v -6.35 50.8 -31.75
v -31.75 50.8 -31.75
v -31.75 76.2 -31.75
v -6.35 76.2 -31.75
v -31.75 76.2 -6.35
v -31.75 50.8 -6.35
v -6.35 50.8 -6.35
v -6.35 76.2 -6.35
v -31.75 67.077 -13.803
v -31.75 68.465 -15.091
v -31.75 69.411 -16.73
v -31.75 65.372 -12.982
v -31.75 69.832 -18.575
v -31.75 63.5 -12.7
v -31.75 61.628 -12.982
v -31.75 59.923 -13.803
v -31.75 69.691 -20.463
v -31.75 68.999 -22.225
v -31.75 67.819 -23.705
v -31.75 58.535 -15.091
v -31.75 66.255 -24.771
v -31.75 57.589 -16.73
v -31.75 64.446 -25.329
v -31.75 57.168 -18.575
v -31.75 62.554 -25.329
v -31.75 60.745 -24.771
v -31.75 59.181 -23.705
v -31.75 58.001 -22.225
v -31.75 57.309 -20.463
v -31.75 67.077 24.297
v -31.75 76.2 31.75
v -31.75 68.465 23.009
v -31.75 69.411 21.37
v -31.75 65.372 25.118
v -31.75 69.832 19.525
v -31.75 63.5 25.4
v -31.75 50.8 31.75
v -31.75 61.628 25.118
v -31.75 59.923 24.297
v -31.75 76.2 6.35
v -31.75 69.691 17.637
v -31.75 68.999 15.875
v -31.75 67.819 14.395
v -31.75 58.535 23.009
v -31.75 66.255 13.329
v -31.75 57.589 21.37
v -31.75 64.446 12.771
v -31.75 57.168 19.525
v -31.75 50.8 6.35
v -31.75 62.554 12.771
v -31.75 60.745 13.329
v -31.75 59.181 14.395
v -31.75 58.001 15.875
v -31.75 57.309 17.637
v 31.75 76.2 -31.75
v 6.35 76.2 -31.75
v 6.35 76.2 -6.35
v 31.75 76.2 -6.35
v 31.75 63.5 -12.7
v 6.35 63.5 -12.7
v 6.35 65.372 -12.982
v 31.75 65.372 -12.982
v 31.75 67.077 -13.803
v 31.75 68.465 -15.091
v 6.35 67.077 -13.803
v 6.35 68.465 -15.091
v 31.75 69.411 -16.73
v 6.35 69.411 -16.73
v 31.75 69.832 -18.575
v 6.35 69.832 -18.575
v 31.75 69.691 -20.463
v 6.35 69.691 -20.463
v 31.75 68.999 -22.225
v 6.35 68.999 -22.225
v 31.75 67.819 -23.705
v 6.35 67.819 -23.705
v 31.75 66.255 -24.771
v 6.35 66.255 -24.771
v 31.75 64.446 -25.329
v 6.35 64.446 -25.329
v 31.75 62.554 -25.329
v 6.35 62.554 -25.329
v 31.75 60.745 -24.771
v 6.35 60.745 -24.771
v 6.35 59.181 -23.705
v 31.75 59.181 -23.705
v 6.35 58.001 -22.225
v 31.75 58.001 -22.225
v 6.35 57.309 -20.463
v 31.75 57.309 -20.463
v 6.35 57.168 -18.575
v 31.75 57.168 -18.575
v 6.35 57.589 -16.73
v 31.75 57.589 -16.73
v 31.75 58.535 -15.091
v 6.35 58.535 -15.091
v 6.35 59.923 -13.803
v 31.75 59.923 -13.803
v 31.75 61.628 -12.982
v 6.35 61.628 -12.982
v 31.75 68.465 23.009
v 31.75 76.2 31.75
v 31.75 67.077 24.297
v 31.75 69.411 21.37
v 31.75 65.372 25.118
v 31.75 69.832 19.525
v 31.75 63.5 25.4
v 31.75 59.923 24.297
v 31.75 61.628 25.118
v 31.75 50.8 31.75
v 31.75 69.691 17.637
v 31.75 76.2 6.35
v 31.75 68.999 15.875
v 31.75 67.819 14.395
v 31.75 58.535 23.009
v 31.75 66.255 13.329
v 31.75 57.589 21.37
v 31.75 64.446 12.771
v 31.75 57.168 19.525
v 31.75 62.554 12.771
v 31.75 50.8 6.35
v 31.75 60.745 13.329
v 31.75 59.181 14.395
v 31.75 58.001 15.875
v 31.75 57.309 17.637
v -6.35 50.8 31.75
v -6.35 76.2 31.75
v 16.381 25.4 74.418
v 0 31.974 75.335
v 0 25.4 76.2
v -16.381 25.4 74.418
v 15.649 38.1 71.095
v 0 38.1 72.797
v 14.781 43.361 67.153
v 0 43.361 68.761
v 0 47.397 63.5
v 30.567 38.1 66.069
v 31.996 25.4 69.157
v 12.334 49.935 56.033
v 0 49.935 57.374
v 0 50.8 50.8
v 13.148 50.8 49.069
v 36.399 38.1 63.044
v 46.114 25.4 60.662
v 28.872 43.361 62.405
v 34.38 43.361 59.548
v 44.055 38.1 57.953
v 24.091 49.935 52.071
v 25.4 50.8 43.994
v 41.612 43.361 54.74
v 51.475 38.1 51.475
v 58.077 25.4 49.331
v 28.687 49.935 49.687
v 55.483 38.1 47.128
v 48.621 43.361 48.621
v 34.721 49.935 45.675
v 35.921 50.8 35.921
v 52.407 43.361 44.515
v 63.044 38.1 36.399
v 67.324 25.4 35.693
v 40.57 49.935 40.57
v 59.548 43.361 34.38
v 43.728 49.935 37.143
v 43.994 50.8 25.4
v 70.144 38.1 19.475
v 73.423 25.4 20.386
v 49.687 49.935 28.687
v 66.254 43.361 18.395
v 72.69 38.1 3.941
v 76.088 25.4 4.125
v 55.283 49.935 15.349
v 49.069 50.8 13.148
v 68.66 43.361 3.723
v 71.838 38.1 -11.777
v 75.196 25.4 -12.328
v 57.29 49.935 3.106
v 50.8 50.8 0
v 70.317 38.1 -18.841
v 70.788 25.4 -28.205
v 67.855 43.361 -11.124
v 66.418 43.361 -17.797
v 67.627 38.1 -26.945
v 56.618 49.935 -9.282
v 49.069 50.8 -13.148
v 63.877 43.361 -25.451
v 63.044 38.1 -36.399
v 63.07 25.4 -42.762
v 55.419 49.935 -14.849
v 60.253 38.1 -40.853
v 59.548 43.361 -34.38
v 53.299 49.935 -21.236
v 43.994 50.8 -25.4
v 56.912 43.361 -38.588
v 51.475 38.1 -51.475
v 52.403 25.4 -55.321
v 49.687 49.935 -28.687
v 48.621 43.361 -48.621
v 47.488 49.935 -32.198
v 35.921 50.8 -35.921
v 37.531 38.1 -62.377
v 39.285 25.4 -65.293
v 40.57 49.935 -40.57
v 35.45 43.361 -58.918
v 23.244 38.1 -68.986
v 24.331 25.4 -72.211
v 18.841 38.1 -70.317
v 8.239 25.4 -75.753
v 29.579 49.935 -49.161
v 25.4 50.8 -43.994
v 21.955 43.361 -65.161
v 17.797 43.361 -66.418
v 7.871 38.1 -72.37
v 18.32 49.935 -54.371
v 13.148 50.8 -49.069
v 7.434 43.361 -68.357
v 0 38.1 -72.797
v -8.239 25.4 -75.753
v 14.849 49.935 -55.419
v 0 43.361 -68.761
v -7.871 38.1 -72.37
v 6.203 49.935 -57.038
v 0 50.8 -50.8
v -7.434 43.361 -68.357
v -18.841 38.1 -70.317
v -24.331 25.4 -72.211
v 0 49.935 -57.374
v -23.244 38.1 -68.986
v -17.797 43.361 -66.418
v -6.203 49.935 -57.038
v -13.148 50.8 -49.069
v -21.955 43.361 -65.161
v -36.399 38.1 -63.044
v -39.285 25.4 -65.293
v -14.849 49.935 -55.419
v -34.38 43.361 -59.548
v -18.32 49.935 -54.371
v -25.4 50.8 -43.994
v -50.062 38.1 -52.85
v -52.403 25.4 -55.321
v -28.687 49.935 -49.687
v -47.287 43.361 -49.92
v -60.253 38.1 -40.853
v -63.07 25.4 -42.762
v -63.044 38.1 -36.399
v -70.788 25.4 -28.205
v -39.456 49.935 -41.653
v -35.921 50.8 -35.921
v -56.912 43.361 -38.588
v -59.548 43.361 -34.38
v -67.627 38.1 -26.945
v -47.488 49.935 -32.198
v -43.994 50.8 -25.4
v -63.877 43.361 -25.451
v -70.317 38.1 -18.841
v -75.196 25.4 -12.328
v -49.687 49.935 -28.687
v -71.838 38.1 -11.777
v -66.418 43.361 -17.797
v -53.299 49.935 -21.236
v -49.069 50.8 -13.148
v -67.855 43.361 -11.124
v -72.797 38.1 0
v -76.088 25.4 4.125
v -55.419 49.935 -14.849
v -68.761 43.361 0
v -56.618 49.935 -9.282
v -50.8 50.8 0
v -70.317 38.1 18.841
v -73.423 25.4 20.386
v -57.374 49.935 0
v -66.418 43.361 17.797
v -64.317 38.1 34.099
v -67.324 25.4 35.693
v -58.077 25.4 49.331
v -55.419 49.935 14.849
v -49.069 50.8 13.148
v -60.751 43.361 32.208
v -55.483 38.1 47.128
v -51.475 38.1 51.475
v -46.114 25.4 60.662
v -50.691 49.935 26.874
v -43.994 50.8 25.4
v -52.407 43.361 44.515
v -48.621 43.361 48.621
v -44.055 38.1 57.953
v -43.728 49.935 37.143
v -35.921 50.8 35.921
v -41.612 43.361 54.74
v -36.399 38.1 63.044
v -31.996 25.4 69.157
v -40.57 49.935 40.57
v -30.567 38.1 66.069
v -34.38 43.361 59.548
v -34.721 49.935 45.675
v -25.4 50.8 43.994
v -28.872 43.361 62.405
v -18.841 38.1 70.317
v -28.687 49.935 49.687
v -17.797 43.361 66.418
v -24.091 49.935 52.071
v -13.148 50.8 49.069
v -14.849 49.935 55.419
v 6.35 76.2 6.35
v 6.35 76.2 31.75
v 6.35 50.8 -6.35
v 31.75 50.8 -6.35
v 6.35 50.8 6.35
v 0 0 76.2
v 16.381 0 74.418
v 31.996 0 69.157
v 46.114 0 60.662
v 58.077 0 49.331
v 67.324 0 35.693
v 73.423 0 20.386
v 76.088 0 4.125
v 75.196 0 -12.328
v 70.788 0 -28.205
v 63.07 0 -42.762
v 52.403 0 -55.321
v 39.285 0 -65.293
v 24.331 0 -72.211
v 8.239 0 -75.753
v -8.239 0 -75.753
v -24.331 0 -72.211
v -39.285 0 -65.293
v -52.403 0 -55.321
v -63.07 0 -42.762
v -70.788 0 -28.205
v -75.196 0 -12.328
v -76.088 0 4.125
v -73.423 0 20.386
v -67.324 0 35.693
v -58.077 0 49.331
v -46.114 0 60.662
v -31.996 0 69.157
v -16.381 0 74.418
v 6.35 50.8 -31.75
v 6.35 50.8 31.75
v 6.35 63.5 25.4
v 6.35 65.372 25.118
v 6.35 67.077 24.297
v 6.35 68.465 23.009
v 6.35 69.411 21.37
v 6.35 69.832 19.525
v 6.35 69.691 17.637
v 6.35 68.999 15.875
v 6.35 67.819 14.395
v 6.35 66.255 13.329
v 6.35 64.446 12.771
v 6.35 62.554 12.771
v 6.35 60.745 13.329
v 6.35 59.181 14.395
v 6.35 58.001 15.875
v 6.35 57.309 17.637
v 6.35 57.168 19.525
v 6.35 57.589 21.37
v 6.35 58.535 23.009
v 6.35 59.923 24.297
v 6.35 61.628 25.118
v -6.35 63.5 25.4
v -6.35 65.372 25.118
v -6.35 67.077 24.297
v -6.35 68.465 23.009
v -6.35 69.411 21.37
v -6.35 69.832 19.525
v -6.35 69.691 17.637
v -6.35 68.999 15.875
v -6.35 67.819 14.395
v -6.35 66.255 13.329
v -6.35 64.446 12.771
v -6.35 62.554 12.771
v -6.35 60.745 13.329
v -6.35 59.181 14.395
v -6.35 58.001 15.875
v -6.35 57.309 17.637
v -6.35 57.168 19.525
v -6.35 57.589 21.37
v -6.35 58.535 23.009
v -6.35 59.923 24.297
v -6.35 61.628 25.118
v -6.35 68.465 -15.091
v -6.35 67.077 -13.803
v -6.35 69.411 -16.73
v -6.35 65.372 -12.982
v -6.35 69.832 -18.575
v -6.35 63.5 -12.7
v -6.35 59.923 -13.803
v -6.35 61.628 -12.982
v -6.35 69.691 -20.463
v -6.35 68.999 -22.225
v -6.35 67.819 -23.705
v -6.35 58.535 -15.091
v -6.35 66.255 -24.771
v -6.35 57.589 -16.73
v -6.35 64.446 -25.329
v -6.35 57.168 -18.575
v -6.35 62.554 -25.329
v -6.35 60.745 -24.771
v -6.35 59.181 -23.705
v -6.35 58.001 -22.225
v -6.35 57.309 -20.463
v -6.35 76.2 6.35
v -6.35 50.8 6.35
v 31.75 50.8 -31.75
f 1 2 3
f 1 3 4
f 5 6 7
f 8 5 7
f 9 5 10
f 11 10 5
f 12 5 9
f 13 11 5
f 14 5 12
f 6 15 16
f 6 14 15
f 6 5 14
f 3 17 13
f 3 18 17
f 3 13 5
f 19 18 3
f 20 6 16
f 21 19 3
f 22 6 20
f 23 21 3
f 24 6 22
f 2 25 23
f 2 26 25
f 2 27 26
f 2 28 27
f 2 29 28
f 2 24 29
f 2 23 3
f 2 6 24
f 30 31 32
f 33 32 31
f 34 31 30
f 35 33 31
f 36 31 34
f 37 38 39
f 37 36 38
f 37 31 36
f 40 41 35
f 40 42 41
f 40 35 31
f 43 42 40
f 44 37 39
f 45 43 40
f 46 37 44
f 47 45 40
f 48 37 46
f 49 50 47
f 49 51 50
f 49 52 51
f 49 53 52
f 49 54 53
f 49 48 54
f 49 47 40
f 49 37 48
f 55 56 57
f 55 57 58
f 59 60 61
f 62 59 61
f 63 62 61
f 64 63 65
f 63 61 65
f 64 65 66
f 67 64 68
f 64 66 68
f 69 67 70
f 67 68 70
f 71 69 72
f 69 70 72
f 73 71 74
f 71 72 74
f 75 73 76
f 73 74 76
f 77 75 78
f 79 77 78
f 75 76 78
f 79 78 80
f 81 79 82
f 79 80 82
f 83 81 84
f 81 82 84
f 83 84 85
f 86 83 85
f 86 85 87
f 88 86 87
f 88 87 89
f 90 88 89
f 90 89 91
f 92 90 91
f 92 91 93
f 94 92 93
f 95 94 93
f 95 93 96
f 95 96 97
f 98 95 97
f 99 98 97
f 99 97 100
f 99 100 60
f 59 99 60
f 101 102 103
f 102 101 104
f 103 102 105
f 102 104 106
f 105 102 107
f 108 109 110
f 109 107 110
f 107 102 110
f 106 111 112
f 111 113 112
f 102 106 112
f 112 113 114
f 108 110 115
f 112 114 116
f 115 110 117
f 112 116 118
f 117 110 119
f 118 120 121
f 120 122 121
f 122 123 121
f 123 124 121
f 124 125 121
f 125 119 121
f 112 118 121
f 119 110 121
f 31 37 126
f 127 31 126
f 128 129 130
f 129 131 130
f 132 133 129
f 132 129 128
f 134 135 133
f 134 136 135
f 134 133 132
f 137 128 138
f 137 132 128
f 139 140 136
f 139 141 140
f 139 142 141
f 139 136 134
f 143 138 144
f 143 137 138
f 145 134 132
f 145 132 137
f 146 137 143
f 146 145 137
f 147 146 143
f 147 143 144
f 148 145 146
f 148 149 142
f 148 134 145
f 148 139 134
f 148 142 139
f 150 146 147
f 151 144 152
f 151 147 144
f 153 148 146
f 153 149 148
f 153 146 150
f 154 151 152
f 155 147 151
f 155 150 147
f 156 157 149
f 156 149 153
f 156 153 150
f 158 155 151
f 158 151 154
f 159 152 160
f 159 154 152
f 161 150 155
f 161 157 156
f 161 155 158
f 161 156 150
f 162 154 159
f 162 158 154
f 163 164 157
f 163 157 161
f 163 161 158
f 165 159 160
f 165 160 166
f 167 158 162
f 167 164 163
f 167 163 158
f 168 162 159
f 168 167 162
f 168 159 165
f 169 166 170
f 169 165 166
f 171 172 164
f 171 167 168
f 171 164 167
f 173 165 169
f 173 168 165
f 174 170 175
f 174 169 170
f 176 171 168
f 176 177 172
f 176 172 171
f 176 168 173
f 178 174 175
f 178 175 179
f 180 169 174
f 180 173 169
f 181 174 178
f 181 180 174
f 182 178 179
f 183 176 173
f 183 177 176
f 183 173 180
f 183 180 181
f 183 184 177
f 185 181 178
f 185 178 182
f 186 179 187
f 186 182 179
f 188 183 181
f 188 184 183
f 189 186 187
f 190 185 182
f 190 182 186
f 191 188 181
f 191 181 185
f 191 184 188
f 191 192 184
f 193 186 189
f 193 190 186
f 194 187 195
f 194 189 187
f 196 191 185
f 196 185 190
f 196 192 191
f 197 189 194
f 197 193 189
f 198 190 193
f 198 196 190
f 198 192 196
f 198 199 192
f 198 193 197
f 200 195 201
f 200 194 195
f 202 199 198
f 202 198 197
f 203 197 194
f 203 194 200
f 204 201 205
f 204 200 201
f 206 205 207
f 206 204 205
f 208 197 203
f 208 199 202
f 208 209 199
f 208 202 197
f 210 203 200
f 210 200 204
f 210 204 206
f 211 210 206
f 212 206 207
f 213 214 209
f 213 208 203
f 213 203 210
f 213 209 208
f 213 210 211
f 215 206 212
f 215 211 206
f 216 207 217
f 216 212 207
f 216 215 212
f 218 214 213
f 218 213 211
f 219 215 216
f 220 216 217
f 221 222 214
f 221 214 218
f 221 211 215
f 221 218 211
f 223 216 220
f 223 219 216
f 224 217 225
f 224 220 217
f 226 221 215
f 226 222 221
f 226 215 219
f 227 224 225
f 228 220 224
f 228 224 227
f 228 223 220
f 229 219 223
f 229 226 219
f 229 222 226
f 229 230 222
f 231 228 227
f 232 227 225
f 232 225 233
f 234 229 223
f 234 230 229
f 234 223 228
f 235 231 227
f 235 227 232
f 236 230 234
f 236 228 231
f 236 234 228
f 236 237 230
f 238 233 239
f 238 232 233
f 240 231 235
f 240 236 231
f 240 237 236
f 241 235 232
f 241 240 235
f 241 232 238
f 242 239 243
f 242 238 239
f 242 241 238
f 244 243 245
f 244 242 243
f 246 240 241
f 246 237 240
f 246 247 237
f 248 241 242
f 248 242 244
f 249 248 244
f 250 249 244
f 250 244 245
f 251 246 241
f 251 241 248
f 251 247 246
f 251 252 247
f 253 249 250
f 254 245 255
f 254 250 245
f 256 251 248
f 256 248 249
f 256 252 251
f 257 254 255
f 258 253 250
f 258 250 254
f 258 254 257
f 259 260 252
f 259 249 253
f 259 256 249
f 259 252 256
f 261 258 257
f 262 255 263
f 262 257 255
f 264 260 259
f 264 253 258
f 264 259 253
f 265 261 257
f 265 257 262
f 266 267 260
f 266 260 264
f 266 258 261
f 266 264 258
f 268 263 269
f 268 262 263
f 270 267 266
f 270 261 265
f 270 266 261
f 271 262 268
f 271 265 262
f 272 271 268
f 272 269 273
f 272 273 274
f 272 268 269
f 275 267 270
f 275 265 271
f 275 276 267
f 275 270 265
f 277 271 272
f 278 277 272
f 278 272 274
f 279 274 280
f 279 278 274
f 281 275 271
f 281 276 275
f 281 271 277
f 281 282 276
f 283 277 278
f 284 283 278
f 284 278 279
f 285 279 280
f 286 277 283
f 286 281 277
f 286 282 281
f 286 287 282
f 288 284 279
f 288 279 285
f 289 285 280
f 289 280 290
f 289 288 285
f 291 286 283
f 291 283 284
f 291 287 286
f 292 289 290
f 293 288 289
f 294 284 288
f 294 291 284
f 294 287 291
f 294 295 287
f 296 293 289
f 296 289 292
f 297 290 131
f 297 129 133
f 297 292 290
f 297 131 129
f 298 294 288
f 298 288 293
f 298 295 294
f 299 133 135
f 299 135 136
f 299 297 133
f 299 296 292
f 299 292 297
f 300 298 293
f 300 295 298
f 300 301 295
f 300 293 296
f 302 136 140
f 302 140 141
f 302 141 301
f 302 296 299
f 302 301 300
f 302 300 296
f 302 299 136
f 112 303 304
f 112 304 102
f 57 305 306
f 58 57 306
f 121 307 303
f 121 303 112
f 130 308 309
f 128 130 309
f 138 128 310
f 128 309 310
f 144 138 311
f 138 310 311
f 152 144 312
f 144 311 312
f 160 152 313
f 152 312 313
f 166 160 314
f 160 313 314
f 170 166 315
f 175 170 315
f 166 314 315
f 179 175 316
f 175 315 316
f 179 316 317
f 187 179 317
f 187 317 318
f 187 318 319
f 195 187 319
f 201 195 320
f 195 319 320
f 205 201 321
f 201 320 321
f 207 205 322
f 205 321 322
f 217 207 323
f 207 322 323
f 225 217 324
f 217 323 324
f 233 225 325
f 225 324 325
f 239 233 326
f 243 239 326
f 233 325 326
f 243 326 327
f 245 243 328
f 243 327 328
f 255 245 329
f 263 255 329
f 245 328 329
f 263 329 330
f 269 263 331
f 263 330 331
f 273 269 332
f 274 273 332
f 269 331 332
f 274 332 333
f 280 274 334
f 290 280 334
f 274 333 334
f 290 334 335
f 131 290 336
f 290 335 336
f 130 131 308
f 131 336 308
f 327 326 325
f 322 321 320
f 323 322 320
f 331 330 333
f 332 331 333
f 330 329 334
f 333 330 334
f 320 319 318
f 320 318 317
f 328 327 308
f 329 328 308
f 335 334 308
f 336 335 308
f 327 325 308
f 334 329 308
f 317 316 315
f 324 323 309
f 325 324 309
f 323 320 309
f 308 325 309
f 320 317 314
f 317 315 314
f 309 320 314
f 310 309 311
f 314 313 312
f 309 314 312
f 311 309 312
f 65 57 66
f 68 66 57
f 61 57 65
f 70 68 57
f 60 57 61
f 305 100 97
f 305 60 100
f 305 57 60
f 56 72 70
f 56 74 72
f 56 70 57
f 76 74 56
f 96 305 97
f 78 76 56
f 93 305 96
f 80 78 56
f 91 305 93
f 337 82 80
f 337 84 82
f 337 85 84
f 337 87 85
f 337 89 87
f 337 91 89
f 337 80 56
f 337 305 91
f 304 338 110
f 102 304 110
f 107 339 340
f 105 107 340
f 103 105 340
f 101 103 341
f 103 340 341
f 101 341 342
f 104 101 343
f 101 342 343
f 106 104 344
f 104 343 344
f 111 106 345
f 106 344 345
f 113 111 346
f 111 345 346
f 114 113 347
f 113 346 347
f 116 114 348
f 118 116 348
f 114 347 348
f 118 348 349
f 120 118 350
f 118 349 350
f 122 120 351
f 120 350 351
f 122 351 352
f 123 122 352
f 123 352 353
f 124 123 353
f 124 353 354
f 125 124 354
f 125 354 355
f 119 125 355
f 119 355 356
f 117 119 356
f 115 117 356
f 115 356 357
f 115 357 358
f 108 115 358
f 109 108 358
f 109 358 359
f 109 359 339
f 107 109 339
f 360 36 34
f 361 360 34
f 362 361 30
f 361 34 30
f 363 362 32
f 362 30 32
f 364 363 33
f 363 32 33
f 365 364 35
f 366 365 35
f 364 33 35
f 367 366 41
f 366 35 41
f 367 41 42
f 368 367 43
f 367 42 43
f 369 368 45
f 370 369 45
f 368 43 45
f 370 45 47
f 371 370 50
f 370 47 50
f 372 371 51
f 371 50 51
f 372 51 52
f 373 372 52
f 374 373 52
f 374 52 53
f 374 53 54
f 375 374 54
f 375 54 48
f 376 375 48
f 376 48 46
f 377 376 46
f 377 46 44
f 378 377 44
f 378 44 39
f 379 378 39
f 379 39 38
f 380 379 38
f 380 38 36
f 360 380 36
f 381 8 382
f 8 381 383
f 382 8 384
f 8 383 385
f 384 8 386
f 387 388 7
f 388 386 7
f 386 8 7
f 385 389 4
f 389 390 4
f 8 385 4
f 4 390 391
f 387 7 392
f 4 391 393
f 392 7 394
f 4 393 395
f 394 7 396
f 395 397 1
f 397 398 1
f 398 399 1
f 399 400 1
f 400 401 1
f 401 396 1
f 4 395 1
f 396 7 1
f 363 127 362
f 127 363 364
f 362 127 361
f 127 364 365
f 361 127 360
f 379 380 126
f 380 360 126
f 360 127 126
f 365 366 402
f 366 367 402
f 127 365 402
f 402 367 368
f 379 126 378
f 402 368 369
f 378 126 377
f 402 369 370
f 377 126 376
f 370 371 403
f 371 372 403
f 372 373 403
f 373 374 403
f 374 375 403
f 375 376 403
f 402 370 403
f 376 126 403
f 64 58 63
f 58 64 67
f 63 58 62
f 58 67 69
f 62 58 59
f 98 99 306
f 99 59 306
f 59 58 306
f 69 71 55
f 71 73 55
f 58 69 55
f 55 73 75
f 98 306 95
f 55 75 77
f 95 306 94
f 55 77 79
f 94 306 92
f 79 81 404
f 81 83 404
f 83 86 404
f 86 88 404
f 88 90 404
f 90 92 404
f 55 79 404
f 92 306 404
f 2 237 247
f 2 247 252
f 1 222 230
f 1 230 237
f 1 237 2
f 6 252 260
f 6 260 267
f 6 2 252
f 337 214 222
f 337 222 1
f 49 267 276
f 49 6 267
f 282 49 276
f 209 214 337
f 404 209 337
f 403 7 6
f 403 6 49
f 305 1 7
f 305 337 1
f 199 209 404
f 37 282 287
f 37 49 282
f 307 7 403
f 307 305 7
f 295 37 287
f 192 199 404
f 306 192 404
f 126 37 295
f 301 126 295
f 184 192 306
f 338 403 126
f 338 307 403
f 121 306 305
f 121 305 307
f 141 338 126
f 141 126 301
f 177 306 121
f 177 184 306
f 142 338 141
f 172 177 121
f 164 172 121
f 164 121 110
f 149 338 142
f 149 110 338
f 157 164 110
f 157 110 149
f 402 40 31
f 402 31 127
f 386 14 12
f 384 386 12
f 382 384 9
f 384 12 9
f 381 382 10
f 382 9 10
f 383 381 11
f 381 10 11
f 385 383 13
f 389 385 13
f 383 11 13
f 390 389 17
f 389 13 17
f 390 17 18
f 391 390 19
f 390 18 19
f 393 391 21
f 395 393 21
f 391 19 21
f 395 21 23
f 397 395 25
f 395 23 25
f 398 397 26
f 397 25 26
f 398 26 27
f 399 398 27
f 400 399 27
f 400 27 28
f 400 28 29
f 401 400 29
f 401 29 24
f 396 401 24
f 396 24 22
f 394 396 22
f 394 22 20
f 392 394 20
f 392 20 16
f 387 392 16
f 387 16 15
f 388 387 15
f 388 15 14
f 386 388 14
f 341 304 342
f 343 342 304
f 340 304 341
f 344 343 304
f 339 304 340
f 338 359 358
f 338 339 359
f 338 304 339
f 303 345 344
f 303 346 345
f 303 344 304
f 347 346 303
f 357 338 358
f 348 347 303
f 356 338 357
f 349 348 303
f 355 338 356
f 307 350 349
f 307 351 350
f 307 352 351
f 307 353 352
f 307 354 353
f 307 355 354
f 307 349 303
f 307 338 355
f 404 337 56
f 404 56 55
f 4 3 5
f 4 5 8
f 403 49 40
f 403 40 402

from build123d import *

# Parameters (mm, degrees)
SKETCH2_R           = 76.2
BOSS_EXTRUDE2_DEPTH = 50.8
FILLET1_R           = 25.4
SKETCH3_W           = 25.4
SKETCH3_H           = 25.4
BOSS_EXTRUDE3_DEPTH = 25.4
CUT_EXTRUDE2_REACH  = 154.532
SKETCH5_R           = 6.35
CUT_EXTRUDE3_REACH  = 154.532
SKETCH6_R           = 6.35


with BuildPart() as part:
    # Sketch2 → Boss-Extrude2 (new body)
    with BuildSketch(Plane(origin=(0, 0, 0), x_dir=(1, 0, 0), z_dir=(0, 1, 0))):
        with Locations(Location((0, 0, 0), (0, 0, 270))):
            Circle(SKETCH2_R)
    extrude(amount=BOSS_EXTRUDE2_DEPTH)

    # Fillet1
    fillet1_edges = [part.edges().sort_by_distance(p)[0] for p in [
        (0, 50.8, -76.2),
    ]]
    fillet(fillet1_edges, radius=FILLET1_R)

    # Sketch3 → Boss-Extrude3 (add)
    with BuildSketch(Plane(origin=(0, 50.8, 0), x_dir=(1, 0, 0), z_dir=(0, 1, 0))):
        with Locations((-19.05, 19.05)):
            Rectangle(SKETCH3_W, SKETCH3_H)
        with Locations((19.05, 19.05)):
            Rectangle(SKETCH3_W, SKETCH3_H)
        with Locations((-19.05, -19.05)):
            Rectangle(SKETCH3_W, SKETCH3_H)
        with Locations((19.05, -19.05)):
            Rectangle(SKETCH3_W, SKETCH3_H)
    extrude(amount=BOSS_EXTRUDE3_DEPTH)

    # Cut-Extrude2: up to this face of the body (flat: up to its plane)
    cut_extrude2_end = Plane(part.part.faces().sort_by_distance((31.75, 63.5, -19.05))[0])
    # Sketch5 → Cut-Extrude2 (cut, up to the picked face)
    with BuildSketch(Plane.ZY.offset(31.75), mode=Mode.PRIVATE) as cut_extrude2_sk1:
        with Locations((-19.05, 63.5)):
            Circle(SKETCH5_R)
    cut_extrude2_tool1 = split(extrude(cut_extrude2_sk1.sketch, amount=-CUT_EXTRUDE2_REACH, mode=Mode.PRIVATE), bisect_by=cut_extrude2_end, keep=Keep.BOTH, mode=Mode.PRIVATE)
    add(cut_extrude2_tool1.solids().sort_by(Axis((-31.75, 63.5, -19.05), (1, 0, 0)))[0], mode=Mode.SUBTRACT)

    # Cut-Extrude3: up to this face of the body (flat: up to its plane)
    cut_extrude3_end = Plane(part.part.faces().sort_by_distance((31.75, 63.5, 19.05))[0])
    # Sketch6 → Cut-Extrude3 (cut, up to the picked face)
    with BuildSketch(Plane.ZY.offset(31.75), mode=Mode.PRIVATE) as cut_extrude3_sk1:
        with Locations((19.05, 63.5)):
            Circle(SKETCH6_R)
    cut_extrude3_tool1 = split(extrude(cut_extrude3_sk1.sketch, amount=-CUT_EXTRUDE3_REACH, mode=Mode.PRIVATE), bisect_by=cut_extrude3_end, keep=Keep.BOTH, mode=Mode.PRIVATE)
    add(cut_extrude3_tool1.solids().sort_by(Axis((-31.75, 63.5, 19.05), (1, 0, 0)))[0], mode=Mode.SUBTRACT)


solid = part.part
